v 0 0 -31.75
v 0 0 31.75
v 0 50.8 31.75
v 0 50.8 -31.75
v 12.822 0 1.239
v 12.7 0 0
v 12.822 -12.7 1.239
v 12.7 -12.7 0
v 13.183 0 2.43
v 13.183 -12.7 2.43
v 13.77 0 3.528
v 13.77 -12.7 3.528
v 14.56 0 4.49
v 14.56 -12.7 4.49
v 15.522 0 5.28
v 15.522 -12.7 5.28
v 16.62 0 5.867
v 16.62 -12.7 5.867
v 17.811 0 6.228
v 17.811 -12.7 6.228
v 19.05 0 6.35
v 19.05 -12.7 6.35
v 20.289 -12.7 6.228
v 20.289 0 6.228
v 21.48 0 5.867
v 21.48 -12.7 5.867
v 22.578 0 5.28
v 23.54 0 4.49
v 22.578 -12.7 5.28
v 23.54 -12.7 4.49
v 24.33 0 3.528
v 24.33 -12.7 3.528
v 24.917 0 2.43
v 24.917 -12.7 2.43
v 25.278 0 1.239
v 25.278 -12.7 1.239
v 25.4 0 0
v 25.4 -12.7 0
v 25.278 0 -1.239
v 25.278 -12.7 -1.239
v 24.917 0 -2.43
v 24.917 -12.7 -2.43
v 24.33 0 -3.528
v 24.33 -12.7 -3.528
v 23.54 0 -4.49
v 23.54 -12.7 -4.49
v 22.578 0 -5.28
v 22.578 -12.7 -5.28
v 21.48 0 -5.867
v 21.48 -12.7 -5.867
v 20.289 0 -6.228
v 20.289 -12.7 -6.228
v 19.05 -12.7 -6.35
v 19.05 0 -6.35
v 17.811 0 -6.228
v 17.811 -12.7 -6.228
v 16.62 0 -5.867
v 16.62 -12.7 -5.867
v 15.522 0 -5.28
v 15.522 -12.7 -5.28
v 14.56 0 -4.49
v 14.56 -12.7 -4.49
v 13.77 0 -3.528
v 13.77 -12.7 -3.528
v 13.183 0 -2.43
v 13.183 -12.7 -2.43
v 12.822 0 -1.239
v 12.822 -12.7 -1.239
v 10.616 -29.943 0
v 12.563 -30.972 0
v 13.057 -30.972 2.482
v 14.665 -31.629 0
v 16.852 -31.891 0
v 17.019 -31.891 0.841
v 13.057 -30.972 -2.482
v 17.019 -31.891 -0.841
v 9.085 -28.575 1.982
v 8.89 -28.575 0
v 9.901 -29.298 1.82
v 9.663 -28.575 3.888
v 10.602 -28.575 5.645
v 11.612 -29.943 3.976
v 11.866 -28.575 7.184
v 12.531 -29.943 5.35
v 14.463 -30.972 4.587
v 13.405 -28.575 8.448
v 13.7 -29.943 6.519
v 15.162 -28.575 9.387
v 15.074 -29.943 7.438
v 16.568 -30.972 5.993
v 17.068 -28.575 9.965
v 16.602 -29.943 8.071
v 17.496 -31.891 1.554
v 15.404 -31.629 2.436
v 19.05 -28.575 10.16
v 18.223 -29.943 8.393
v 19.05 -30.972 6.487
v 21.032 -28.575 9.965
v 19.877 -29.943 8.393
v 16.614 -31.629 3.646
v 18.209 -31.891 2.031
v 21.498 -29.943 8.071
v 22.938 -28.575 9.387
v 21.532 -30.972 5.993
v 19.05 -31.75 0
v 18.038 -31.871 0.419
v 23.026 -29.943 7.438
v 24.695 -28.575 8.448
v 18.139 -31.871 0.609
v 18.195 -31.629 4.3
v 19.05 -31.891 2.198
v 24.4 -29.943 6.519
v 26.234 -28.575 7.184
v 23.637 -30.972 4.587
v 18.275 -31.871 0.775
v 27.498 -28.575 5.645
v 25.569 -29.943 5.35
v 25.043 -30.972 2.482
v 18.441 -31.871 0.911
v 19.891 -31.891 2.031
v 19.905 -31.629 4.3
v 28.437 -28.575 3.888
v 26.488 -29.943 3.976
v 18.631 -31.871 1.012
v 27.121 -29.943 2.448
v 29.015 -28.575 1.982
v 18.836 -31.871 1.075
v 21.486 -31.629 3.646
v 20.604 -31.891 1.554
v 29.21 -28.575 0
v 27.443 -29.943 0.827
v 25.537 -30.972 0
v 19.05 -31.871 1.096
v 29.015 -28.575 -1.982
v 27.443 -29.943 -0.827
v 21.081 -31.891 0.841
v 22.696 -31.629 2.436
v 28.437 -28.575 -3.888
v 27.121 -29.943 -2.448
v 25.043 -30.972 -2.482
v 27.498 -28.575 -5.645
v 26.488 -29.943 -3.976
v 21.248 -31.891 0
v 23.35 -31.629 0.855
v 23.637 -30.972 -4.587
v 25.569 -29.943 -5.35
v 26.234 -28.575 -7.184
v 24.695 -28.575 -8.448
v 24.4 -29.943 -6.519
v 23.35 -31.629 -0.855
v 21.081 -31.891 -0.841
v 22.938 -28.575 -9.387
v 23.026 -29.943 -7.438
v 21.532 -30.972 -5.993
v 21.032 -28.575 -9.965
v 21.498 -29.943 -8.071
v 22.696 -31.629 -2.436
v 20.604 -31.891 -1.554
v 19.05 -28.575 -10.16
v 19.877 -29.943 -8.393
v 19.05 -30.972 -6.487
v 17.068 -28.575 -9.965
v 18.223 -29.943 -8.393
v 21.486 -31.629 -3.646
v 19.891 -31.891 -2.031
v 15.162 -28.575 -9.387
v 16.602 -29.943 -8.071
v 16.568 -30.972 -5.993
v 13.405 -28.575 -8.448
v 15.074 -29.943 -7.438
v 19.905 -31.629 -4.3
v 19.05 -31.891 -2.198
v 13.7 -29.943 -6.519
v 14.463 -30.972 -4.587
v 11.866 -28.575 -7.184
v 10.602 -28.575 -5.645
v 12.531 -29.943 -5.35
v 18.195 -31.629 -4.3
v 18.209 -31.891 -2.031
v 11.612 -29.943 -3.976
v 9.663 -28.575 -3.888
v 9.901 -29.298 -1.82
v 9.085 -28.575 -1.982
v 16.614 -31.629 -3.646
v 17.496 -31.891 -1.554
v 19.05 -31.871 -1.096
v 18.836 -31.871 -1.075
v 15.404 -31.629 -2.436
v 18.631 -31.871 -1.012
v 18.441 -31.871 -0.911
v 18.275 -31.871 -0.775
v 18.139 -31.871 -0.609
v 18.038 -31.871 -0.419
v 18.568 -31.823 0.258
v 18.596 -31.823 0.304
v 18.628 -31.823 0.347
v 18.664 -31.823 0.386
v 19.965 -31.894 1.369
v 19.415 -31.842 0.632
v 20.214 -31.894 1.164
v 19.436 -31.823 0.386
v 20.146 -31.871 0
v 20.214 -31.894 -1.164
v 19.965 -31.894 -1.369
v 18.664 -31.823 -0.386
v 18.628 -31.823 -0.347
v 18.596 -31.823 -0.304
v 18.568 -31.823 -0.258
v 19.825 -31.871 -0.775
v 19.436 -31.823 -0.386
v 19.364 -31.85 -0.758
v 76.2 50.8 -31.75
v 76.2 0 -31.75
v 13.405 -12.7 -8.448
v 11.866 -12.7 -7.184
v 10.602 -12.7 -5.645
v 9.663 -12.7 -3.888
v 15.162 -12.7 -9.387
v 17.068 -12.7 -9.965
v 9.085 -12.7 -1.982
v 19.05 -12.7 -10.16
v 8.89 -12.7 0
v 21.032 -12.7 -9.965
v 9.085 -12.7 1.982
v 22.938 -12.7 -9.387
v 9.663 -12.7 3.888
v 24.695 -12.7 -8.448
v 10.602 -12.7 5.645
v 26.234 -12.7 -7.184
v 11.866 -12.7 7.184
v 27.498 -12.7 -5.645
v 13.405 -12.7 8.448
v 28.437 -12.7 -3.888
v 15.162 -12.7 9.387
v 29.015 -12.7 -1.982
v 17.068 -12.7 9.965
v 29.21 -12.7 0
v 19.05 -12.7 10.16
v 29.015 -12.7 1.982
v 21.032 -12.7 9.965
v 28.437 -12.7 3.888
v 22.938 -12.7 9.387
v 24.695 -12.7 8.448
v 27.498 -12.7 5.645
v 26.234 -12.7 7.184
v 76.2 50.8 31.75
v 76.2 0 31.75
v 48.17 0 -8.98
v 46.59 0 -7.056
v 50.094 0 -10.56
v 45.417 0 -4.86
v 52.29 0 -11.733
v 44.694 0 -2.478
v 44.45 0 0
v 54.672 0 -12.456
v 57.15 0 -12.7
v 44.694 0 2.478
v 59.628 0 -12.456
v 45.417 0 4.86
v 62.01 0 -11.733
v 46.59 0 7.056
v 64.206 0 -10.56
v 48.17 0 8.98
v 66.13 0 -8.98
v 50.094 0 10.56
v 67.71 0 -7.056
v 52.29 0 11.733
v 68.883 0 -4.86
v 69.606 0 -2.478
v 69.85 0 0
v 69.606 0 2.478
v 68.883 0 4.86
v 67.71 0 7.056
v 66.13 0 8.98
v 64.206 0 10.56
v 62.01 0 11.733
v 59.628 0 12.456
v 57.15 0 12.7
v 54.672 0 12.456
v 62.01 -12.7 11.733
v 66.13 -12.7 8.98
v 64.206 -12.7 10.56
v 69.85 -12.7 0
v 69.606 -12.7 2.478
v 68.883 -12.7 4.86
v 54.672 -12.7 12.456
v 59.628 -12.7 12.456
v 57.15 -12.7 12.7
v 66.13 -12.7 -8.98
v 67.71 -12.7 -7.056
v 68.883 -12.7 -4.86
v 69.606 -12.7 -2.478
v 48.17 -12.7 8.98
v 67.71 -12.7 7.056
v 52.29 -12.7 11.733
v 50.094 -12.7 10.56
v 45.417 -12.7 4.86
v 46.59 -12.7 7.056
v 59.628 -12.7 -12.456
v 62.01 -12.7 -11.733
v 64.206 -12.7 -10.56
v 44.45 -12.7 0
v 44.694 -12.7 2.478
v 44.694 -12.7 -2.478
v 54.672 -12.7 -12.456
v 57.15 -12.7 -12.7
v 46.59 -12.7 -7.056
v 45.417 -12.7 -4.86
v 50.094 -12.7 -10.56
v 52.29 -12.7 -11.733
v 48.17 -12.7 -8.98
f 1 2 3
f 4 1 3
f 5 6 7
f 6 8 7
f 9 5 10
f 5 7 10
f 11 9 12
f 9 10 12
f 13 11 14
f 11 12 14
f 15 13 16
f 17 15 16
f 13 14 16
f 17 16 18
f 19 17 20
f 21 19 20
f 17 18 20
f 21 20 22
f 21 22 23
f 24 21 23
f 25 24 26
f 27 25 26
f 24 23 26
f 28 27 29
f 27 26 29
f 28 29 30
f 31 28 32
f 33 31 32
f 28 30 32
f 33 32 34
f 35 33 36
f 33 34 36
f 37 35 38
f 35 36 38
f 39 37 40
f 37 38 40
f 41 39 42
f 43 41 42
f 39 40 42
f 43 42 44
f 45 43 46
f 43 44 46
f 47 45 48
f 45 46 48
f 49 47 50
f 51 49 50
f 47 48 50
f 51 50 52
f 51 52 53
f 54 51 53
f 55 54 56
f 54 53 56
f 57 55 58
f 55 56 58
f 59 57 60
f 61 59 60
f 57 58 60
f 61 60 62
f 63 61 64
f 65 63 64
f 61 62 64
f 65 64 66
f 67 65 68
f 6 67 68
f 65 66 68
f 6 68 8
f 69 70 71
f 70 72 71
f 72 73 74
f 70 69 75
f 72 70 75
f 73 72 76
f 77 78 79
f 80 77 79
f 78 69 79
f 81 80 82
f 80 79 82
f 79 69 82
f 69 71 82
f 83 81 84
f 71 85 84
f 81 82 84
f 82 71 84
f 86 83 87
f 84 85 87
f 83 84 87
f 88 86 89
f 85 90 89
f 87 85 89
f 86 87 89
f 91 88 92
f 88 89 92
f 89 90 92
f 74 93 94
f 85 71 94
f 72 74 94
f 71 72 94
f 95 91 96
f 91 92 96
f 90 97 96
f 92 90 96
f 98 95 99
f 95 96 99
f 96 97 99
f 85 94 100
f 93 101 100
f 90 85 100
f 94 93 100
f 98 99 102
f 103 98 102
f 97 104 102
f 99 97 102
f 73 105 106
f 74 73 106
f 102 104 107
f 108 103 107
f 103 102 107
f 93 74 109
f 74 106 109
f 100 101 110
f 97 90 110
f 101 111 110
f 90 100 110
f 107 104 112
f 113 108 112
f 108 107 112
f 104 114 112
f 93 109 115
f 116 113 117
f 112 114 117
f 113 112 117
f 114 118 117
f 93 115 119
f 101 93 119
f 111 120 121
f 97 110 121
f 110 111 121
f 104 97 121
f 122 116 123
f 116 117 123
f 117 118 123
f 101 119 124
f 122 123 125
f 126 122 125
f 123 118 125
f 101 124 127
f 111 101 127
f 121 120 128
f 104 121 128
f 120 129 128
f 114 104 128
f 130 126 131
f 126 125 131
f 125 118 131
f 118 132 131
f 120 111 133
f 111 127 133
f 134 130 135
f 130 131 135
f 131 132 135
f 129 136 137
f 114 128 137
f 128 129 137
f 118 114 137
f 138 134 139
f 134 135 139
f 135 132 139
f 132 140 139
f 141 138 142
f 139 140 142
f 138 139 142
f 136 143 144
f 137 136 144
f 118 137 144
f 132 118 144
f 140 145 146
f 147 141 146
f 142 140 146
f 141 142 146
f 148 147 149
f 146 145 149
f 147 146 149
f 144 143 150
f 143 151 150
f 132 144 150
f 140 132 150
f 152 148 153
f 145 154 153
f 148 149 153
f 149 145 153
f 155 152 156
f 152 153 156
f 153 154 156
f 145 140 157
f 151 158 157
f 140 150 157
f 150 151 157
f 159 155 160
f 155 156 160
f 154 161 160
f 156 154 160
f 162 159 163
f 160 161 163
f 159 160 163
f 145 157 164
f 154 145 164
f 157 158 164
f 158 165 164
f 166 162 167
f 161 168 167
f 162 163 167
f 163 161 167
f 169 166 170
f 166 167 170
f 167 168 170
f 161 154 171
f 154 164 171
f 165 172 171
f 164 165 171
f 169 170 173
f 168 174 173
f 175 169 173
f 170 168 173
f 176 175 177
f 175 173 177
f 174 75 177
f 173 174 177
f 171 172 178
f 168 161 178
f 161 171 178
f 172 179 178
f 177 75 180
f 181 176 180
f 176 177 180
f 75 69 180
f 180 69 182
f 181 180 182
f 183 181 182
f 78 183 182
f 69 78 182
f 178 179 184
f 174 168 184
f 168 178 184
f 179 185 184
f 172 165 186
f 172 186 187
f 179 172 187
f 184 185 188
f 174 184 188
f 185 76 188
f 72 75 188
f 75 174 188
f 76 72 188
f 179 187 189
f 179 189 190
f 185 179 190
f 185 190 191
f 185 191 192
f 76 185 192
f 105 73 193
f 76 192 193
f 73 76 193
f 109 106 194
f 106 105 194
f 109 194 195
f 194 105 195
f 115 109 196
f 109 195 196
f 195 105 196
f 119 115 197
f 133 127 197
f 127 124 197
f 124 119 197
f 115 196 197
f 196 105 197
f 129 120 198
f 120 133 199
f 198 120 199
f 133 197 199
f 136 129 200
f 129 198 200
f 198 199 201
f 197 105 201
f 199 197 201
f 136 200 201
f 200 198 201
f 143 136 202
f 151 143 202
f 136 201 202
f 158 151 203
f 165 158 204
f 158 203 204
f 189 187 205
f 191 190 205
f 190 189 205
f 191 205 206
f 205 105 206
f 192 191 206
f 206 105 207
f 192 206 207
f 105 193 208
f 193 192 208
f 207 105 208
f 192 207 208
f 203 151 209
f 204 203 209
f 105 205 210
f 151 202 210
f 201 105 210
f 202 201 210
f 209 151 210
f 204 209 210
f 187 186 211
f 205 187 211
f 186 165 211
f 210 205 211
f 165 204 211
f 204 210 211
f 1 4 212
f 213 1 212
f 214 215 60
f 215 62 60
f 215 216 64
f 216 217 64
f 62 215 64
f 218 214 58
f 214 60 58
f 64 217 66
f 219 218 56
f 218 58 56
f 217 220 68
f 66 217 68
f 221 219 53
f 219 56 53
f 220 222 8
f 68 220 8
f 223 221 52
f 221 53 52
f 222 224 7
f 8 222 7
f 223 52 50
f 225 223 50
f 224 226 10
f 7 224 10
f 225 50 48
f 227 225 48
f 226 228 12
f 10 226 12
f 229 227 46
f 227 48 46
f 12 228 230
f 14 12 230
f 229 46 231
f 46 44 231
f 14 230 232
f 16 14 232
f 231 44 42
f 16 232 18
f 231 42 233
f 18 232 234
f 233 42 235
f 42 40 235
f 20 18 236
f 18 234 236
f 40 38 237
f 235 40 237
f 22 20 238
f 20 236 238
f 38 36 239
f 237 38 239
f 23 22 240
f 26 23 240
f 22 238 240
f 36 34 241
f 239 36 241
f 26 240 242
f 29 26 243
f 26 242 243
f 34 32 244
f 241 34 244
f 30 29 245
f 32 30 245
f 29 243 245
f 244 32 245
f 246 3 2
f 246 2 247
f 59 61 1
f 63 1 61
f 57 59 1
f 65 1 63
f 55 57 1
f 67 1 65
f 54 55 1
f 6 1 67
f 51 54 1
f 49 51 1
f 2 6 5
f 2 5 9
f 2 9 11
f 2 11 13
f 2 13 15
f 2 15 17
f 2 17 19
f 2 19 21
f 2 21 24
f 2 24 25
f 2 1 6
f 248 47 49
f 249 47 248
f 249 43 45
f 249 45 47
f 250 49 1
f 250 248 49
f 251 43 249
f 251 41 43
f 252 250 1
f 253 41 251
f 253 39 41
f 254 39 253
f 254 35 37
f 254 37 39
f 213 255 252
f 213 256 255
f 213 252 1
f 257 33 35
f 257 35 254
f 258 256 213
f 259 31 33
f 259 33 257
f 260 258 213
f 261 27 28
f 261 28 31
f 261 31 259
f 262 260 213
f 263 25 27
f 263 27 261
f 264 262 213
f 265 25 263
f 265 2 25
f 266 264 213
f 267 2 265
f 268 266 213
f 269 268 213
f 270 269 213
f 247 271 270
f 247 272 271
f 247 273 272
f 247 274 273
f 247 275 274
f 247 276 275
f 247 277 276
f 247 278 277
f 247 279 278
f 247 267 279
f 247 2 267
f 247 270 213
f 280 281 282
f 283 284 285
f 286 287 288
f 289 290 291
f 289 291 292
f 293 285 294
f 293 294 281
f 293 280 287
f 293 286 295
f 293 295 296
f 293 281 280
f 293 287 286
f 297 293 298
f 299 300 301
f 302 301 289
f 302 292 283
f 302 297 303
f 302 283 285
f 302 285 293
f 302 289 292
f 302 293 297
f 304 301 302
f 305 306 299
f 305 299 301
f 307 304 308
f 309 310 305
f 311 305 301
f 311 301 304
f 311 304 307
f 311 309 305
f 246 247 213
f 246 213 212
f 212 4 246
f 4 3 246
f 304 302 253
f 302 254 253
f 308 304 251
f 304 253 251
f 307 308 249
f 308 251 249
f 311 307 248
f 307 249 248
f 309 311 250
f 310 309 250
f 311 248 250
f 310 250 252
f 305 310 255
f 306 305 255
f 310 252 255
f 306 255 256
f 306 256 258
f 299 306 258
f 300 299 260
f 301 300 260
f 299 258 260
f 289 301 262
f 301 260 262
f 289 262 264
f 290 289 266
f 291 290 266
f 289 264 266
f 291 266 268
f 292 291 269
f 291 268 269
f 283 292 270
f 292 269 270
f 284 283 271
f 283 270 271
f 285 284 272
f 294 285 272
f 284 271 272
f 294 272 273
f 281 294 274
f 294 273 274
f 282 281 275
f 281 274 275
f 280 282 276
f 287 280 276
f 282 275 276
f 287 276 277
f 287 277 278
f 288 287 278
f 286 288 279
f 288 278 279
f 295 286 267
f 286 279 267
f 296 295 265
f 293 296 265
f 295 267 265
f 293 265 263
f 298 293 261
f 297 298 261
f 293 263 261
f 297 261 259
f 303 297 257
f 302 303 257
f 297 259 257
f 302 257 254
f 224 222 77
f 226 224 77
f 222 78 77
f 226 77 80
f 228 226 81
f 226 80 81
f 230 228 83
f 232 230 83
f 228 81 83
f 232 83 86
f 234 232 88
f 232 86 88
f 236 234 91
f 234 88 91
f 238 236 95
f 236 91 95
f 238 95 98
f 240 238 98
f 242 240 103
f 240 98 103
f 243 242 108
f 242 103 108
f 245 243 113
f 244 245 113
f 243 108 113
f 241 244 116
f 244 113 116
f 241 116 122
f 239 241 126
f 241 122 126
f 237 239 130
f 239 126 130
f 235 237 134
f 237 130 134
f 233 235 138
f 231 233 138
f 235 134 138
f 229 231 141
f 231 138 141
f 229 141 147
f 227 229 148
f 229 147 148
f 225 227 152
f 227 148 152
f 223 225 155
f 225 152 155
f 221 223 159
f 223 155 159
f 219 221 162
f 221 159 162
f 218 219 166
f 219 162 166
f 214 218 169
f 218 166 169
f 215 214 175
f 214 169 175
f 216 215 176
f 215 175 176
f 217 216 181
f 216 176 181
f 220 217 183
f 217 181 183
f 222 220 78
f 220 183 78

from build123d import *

# Parameters (mm, degrees)
SKETCH1_W           = 76.2
SKETCH1_H           = 50.8
BOSS_EXTRUDE1_DEPTH = 31.75
SKETCH4_W           = 12.7
SKETCH4_H           = 12.7


with BuildPart() as part:
    # Sketch1 → Boss-Extrude1 (new body, symmetric)
    with BuildSketch(Plane.XY):
        with Locations((38.1, 25.4)):
            Rectangle(SKETCH1_W, SKETCH1_H)
    extrude(amount=BOSS_EXTRUDE1_DEPTH, both=True)

    # Sketch3 → Revolve1 (revolve)
    with BuildSketch(Plane.XY):
        with BuildLine():
            Line((12.7, 0), (12.7, -12.7))
            Line((12.7, -12.7), (8.89, -12.7))
            Line((8.89, -12.7), (8.89, -28.575))
            ThreePointArc((8.89, -28.575), (13.599228719, -31.3489681), (19.05, -31.75))
            Line((19.05, -31.75), (19.05, -28.575))
            Line((19.05, -28.575), (19.05, 0))
            Line((19.05, 0), (12.7, 0))
        make_face()
    revolve(axis=Axis((19.05, -28.575, 0), (0, 1, 0)))

    # Sketch4 → Revolve2 (revolve)
    with BuildSketch(Plane.XY):
        with Locations((50.8, -6.35)):
            Rectangle(SKETCH4_W, SKETCH4_H)
    revolve(axis=Axis((57.15, 0, 0), (0, -1, 0)))


solid = part.part
